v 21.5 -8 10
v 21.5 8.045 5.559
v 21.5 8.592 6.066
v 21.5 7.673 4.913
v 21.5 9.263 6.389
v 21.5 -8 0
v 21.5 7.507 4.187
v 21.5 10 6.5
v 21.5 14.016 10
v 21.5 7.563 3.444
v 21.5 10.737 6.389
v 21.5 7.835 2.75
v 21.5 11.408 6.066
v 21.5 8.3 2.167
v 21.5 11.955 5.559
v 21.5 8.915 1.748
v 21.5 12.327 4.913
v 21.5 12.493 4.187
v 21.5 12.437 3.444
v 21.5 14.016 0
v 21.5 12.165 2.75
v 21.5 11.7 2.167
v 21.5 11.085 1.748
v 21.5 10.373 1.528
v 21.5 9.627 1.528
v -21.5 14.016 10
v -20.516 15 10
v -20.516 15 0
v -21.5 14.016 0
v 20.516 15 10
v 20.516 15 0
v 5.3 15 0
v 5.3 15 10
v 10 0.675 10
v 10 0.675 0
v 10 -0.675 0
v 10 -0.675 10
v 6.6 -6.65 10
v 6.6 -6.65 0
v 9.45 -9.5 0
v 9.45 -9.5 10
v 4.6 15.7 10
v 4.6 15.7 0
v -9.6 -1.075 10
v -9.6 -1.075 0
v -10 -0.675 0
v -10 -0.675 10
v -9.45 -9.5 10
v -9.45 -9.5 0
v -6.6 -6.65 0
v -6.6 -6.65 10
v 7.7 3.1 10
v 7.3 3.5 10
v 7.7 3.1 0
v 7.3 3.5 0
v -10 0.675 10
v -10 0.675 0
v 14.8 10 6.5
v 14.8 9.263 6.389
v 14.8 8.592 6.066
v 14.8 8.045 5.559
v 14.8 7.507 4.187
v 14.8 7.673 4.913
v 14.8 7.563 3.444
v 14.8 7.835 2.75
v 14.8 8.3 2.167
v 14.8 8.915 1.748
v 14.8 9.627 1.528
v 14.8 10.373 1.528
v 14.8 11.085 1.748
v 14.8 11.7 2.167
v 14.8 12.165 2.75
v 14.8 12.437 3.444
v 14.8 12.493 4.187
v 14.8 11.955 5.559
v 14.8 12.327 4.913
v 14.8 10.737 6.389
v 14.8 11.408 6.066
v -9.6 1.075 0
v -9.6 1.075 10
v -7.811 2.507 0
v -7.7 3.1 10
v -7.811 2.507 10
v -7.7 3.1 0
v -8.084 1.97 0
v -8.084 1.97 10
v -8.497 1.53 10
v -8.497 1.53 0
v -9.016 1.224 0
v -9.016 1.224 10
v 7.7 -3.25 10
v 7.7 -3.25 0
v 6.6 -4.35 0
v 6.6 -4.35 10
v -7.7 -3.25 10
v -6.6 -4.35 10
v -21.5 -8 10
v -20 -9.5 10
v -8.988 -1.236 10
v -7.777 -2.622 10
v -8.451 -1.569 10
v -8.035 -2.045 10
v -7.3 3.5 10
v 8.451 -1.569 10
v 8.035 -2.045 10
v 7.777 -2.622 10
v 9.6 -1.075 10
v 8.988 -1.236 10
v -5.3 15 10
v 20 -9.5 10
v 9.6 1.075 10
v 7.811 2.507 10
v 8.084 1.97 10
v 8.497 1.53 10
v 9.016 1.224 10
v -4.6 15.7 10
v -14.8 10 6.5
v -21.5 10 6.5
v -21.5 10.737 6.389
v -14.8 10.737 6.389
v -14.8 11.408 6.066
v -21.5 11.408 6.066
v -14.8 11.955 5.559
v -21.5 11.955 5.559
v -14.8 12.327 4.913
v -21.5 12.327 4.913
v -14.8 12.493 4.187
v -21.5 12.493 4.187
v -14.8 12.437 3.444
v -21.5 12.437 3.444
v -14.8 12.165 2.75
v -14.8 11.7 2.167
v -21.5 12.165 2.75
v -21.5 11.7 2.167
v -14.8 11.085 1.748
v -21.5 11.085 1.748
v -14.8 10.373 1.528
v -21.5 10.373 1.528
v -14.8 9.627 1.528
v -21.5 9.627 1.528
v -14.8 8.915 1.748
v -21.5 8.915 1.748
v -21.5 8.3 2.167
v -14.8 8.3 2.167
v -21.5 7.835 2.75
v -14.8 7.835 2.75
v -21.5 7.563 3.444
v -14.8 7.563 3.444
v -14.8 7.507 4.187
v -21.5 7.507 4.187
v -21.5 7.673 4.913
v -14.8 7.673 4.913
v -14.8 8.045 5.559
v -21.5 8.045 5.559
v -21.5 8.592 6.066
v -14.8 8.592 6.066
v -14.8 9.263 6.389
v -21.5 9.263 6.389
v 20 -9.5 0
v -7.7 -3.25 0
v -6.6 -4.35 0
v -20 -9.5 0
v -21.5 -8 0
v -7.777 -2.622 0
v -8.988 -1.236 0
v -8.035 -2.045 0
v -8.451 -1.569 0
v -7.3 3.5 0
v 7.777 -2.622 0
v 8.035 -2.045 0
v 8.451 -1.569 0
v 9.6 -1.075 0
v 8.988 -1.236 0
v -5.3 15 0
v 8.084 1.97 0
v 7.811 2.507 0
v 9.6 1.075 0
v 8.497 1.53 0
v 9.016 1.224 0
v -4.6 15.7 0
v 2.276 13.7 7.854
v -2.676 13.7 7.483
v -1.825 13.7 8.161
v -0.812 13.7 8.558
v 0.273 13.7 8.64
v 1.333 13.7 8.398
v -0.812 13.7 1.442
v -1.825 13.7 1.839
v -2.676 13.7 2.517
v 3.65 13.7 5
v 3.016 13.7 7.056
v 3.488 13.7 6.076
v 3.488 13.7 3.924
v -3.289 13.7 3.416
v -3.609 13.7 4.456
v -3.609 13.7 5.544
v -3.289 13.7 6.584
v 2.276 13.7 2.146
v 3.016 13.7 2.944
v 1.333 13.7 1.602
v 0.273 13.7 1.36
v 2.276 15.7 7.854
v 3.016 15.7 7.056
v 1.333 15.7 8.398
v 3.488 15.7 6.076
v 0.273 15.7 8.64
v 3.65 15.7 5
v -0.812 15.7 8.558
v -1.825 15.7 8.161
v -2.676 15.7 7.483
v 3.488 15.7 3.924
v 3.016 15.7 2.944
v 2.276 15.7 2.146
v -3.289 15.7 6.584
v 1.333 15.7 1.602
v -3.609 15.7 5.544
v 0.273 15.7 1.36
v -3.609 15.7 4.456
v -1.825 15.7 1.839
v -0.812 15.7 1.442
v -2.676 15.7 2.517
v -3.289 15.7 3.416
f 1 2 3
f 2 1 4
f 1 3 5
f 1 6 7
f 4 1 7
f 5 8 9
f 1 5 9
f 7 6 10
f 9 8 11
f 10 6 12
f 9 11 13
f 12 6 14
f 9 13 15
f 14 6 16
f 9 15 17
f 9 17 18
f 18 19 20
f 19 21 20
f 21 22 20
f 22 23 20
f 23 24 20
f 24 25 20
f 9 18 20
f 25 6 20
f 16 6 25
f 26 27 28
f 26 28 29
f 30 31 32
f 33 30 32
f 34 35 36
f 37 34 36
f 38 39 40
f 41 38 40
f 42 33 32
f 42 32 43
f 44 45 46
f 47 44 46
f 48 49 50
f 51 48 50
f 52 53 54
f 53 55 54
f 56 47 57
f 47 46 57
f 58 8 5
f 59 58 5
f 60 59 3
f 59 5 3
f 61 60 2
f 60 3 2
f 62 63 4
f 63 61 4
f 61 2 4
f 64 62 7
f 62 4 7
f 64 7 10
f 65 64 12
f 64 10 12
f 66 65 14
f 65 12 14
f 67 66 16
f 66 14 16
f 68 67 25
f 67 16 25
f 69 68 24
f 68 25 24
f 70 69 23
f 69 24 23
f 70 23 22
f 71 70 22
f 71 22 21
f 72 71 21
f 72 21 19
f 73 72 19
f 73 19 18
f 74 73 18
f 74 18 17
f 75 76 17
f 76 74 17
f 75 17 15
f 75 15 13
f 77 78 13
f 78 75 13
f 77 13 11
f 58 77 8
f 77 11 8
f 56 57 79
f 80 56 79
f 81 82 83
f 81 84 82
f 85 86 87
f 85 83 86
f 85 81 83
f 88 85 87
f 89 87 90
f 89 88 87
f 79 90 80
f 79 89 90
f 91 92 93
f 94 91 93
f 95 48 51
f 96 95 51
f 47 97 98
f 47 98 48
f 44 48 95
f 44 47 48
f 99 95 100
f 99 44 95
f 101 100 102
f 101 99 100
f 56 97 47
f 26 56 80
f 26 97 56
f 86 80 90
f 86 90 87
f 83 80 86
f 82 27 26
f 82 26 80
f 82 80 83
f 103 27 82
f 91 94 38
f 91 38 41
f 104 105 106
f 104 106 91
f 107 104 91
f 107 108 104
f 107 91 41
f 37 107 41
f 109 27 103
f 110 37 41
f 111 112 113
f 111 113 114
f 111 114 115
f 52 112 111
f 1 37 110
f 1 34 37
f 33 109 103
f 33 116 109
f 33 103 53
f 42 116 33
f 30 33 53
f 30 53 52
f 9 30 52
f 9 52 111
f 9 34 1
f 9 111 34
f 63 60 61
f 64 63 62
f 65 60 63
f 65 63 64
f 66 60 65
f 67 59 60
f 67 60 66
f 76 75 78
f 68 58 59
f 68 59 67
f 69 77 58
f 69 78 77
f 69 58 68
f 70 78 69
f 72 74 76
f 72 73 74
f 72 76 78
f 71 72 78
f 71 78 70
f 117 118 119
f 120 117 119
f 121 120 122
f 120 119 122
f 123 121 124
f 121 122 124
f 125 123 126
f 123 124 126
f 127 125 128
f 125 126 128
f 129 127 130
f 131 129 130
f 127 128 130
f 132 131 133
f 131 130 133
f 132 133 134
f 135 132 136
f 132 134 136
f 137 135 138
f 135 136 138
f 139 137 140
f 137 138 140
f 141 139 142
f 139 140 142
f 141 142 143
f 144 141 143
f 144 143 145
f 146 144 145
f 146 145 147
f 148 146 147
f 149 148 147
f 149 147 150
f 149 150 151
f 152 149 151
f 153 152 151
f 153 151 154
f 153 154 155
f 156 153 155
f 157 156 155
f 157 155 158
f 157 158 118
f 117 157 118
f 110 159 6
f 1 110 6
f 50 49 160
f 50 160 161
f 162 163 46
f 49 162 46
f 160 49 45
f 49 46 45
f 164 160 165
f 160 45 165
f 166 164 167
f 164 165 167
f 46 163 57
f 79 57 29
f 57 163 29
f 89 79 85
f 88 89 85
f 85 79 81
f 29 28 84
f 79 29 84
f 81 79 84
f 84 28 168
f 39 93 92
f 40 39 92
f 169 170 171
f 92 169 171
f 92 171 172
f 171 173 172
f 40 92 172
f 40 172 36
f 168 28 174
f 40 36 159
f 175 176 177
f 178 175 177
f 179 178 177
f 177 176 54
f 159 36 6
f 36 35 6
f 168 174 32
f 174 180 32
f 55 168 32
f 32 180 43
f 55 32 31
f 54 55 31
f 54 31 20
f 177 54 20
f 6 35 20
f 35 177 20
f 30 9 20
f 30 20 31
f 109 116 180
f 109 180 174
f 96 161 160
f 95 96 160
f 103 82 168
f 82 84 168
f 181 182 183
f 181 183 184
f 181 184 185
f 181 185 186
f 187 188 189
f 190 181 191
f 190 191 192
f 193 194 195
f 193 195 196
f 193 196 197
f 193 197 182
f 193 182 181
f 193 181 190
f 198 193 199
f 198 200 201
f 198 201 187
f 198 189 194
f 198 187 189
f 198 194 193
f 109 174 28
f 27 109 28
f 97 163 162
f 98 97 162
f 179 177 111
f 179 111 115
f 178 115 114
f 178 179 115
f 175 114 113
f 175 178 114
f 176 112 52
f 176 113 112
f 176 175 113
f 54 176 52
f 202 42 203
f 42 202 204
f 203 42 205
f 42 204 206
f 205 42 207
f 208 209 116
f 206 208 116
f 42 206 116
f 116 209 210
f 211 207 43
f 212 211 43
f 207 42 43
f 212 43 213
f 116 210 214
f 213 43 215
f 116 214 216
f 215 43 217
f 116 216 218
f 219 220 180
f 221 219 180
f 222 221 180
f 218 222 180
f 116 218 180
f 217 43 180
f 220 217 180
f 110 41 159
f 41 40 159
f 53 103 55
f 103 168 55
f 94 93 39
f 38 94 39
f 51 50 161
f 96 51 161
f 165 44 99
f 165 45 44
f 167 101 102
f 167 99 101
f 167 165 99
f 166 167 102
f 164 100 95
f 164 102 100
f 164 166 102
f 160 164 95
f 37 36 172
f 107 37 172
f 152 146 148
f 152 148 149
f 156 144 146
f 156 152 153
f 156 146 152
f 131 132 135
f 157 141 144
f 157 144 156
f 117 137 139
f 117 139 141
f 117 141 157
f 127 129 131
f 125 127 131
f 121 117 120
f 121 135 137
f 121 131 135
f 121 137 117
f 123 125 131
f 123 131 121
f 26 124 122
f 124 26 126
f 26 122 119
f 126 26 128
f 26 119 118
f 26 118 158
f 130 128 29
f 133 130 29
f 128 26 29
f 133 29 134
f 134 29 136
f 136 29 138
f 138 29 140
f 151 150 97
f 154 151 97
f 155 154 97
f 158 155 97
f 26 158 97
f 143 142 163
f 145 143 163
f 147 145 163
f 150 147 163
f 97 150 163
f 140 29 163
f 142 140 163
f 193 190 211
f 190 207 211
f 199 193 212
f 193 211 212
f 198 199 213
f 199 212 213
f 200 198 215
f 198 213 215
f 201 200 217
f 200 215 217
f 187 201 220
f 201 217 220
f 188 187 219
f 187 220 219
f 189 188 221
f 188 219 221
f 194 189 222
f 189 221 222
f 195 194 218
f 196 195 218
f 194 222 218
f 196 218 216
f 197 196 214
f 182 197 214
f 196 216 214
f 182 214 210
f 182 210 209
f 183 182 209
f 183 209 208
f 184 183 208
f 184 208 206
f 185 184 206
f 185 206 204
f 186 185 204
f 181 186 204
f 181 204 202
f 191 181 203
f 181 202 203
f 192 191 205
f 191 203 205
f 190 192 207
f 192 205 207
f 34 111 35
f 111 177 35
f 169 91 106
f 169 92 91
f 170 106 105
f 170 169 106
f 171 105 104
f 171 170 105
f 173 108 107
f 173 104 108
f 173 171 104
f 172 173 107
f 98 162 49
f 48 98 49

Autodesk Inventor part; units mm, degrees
ref_plane "YZ Plane" through (0, 0, 0) normal (1, 0, 0) x (0, 1, 0)
ref_plane "XZ Plane" through (0, 0, 0) normal (0, 1, 0) x (-1, 0, 0)
ref_plane "XY Plane" through (0, 0, 0) normal (0, 0, 1) x (1, 0, 0)
sketch "Sketch1" plane through (0, 0, 0) normal (0, 0, 1) x (1, 0, 0)
  line L0 (-5.3, 15) -> (-20.5165, 15)
  line L1 (-4.6, 15.7) -> (-5.3, 15)
  line L2 (4.6, 15.7) -> (-4.6, 15.7)
  line L3 (5.3, 15) -> (4.6, 15.7)
  line L4 (20.5165, 15) -> (5.3, 15)
  line L5 (21.5, 14.0165) -> (20.5165, 15)
  line L6 (21.5, -8) -> (21.5, 14.0165)
  line L7 (20, -9.5) -> (21.5, -8)
  line L8 (9.45, -9.5) -> (20, -9.5)
  line L9 (6.6, -6.65) -> (9.45, -9.5)
  line L10 (6.6, -4.35) -> (6.6, -6.65)
  line L11 (7.7, -3.25) -> (6.6, -4.35)
  arc A0 (9.6, -1.075) -> (7.7, -3.25) centre (9.8292, -3.1926) ccw
  line L12 (10, -0.675) -> (9.6, -1.075)
  line L13 (10, 0.675) -> (10, -0.675)
  line L14 (9.6, 1.075) -> (10, 0.675)
  arc A1 (7.7, 3.1) -> (9.6, 1.075) centre (9.828, 3.1928) ccw
  line L15 (7.3, 3.5) -> (7.7, 3.1)
  line L16 (-7.3, 3.5) -> (7.3, 3.5)
  line L17 (-7.7, 3.1) -> (-7.3, 3.5)
  arc A2 (-9.6, 1.075) -> (-7.7, 3.1) centre (-9.828, 3.1928) ccw
  line L18 (-10, 0.675) -> (-9.6, 1.075)
  line L19 (-10, -0.675) -> (-10, 0.675)
  line L20 (-9.6, -1.075) -> (-10, -0.675)
  arc A3 (-7.7, -3.25) -> (-9.6, -1.075) centre (-9.8292, -3.1926) ccw
  line L21 (-6.6, -4.35) -> (-7.7, -3.25)
  line L22 (-6.6, -6.65) -> (-6.6, -4.35)
  line L23 (-9.45, -9.5) -> (-6.6, -6.65)
  line L24 (-20, -9.5) -> (-9.45, -9.5)
  line L25 (-21.5, -8) -> (-20, -9.5)
  line L26 (-21.5, 14.0165) -> (-21.5, -8)
  line L27 (-20.5165, 15) -> (-21.5, 14.0165)
  point P0 (0, 0)
  point P1 (0, 0)
extrude "Extrusion1" add sketch "Sketch1" along normal blind 10
sketch "Sketch2" plane through (-21.5, -8, 0) normal (-1, 0, 0) x (0, 0, 1)
  line L0 (0, 22.0165) -> (0, 0) projected
  line L1 (0, 0) -> (10, 0) projected
  line L2 (10, 22.0165) -> (10, 0) projected
  line L3 (0, 22.0165) -> (10, 22.0165) projected
  line L4 (10, 0) -> (10, 22.0165)
  line L5 (0, 22.0165) -> (10, 22.0165)
  line L6 (0, 0) -> (0, 22.0165)
  line L7 (0, 0) -> (10, 0)
  circle A0 centre (4, 18) radius 2.5
  point P0 (0, 8)
extrude "Extrusion2" cut sketch "Sketch2" against normal blind 6.7 contours A0
mirror "Mirror1" about plane through (0, 0, 0) normal (1, 0, 0) of "Extrusion2"
sketch "Sketch3" plane through (-4.6, 15.7, 0) normal (0, 1, 0) x (1, 0, 0)
  line L0 (9.2, 0) -> (0, 0) projected
  line L1 (0, 0) -> (0, -10) projected
  line L2 (9.2, -10) -> (0, -10) projected
  line L3 (9.2, 0) -> (9.2, -10) projected
  line L4 (0, -10) -> (9.2, -10)
  line L5 (9.2, 0) -> (9.2, -10)
  line L6 (0, 0) -> (9.2, 0)
  line L7 (0, 0) -> (0, -10)
  circle A0 centre (4.6, -5) radius 3.65
  point P0 (4.6, 0)
extrude "Extrusion3" cut sketch "Sketch3" against normal blind 2 contours A0
properties part number "HGR20B"
